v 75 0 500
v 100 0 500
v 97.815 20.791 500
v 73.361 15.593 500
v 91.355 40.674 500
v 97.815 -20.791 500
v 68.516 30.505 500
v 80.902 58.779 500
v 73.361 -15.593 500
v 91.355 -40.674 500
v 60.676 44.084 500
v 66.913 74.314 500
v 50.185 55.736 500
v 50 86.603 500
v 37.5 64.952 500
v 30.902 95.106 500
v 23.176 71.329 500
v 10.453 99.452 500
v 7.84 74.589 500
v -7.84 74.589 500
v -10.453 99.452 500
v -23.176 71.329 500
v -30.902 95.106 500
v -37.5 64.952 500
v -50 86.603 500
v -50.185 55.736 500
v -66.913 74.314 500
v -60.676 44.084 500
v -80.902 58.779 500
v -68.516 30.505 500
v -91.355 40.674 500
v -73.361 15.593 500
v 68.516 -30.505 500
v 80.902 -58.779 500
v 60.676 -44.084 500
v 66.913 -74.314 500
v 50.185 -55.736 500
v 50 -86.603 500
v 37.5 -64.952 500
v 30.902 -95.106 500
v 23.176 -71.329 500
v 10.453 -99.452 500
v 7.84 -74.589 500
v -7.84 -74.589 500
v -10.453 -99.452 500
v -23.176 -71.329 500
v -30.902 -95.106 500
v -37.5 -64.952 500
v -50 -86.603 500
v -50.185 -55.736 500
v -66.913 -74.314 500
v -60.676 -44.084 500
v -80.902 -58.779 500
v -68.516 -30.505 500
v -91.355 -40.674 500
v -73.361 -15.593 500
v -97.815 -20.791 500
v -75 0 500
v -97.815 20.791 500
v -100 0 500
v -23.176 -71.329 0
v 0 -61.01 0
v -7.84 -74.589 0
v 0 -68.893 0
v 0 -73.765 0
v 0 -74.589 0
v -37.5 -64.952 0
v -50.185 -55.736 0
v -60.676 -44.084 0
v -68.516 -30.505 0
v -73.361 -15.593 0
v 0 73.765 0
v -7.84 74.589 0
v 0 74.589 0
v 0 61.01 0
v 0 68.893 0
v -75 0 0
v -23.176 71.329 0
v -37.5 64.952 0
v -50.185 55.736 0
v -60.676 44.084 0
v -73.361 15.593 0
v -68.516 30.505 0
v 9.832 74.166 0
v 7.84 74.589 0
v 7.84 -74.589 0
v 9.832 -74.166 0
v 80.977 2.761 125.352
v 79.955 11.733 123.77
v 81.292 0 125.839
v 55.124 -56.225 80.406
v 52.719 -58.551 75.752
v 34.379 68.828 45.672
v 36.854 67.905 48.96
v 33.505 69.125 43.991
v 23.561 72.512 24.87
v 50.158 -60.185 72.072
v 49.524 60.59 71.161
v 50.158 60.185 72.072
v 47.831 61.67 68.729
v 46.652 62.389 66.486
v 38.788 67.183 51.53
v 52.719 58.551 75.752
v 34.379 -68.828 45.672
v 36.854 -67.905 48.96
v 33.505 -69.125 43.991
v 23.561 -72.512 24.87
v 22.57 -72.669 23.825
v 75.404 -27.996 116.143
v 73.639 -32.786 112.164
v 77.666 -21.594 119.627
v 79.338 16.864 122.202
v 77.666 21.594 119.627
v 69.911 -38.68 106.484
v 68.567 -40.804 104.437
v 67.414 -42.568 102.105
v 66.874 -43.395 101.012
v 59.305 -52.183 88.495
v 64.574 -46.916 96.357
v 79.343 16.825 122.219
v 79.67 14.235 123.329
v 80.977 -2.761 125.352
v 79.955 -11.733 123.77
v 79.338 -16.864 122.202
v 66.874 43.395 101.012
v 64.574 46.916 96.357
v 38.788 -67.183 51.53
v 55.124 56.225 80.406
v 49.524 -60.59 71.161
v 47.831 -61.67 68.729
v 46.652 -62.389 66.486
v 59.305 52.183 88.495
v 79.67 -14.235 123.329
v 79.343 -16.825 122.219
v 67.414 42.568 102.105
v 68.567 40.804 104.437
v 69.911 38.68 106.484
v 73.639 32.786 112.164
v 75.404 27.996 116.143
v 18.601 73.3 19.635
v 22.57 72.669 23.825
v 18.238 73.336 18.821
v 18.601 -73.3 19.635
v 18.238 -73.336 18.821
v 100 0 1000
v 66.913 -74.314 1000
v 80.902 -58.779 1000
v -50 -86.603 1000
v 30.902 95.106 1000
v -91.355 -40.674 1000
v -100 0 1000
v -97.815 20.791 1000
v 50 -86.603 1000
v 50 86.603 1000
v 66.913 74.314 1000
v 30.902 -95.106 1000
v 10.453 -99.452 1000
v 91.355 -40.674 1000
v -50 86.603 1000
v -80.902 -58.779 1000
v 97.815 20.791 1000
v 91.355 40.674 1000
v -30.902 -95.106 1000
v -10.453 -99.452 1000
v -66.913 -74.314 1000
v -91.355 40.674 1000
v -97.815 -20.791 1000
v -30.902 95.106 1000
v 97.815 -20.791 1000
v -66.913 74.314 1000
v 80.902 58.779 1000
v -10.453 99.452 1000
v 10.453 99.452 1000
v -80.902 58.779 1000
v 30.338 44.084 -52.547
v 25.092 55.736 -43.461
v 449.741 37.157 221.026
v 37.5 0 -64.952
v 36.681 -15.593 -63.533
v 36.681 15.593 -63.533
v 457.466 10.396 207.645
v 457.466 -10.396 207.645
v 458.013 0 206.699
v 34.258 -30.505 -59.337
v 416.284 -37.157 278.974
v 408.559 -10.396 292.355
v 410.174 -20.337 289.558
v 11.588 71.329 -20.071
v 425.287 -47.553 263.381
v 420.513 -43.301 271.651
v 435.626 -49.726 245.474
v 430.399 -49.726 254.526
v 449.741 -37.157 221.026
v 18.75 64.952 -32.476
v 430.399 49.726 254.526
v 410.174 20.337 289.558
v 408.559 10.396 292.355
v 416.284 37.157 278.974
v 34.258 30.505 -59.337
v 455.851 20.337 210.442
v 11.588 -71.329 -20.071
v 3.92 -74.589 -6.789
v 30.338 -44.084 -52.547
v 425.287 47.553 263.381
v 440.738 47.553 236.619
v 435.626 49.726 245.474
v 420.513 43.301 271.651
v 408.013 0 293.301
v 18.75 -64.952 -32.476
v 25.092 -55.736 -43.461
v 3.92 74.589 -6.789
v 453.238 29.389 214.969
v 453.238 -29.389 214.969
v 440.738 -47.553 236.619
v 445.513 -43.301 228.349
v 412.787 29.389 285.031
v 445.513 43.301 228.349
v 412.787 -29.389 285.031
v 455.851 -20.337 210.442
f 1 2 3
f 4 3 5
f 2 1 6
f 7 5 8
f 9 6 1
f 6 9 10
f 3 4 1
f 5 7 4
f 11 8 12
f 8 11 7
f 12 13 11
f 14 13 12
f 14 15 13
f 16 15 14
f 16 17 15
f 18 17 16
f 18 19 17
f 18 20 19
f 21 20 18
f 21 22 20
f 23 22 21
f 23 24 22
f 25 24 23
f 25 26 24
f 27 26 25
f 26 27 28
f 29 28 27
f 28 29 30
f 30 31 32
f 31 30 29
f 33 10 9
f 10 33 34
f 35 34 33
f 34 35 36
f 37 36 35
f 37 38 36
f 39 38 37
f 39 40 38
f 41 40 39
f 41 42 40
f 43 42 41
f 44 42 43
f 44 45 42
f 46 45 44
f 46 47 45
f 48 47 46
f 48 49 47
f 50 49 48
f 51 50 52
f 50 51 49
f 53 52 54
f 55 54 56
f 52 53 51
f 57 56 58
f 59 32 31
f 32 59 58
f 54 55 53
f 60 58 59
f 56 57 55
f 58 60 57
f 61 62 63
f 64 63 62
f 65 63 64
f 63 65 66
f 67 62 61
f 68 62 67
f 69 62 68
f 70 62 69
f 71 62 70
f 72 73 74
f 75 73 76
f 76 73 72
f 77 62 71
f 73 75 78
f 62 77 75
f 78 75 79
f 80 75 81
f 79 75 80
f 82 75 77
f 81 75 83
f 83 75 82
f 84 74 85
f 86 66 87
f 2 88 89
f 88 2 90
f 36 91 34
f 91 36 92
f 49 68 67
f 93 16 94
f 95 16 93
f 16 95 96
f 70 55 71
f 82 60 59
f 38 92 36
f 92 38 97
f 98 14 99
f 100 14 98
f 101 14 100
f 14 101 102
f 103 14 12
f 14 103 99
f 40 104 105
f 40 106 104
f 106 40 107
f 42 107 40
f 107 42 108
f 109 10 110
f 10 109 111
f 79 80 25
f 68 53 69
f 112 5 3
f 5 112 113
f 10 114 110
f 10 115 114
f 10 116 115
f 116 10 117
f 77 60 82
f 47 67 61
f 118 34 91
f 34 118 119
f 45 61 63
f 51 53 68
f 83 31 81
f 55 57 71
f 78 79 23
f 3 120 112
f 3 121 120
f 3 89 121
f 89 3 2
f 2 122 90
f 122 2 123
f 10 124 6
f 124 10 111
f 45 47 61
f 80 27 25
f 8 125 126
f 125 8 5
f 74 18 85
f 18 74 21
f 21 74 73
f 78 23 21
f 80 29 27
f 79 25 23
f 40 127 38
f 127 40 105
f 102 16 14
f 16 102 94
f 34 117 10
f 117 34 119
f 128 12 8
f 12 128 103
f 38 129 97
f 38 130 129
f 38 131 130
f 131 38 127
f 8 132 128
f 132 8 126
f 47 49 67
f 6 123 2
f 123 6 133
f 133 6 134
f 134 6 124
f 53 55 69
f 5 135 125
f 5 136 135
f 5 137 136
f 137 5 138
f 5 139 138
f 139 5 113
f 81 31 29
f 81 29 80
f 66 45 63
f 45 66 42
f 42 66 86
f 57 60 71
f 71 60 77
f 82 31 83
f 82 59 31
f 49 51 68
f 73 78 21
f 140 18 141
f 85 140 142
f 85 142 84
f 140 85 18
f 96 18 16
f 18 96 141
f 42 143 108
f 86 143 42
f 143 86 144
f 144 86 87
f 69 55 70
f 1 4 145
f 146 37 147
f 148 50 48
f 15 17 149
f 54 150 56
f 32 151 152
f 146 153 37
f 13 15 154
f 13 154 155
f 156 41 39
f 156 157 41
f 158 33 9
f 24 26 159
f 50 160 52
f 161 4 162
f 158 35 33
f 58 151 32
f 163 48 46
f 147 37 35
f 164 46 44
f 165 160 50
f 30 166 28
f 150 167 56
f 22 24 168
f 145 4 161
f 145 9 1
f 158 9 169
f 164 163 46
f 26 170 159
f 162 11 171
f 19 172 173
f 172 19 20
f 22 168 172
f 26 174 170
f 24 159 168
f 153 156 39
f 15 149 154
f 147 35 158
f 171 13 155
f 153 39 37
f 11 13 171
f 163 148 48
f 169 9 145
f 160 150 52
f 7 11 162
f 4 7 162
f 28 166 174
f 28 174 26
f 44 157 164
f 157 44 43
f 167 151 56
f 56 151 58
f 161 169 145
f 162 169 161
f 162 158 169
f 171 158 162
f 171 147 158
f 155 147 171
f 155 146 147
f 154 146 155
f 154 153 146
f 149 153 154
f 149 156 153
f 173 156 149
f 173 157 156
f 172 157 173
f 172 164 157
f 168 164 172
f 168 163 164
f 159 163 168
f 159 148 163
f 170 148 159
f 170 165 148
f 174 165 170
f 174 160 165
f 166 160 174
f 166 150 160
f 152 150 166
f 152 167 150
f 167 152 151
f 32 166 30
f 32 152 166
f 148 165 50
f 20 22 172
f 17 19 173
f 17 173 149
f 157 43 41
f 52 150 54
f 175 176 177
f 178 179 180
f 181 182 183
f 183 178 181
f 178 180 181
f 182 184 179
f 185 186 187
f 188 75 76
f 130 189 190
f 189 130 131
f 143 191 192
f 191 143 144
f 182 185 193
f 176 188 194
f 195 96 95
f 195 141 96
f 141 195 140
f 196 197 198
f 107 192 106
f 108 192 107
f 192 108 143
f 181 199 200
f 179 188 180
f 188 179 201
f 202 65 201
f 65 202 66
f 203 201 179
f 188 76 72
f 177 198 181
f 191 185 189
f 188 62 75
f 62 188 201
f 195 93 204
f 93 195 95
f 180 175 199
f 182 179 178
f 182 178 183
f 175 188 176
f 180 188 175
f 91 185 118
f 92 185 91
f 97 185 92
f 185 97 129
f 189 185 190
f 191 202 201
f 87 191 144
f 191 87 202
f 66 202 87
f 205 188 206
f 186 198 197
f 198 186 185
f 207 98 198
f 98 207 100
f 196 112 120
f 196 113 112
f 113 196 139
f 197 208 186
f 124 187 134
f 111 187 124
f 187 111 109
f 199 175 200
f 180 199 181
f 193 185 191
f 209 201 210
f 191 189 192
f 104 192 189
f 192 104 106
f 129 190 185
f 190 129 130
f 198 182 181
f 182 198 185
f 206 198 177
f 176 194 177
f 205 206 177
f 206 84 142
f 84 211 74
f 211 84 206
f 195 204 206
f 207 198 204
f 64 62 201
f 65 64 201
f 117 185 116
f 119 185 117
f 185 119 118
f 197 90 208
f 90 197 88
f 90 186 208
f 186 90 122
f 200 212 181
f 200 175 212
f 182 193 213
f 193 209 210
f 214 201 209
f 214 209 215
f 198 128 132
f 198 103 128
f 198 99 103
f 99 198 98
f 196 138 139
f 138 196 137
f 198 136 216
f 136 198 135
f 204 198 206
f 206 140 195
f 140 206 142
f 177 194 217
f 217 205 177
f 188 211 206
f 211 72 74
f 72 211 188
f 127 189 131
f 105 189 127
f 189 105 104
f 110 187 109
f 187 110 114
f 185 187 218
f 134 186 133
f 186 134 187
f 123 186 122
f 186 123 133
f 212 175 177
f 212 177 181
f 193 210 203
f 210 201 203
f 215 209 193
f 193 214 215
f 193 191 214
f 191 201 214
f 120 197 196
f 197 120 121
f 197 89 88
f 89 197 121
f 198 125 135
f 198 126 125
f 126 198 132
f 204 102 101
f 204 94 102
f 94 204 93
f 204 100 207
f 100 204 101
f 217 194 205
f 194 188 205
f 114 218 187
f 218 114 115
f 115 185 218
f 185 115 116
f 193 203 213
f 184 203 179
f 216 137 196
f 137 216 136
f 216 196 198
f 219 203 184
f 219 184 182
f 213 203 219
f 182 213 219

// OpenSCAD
//human figurine

armBend=90;
forearmLength=500;
forearmDiameter=100;


module arm() 
  {
    module forearm() {
        cylinder (d1=forearmDiameter*1.5,d2=forearmDiameter,h=forearmLength);
    }
        module backarm() {
        cylinder (d1=forearmDiameter*1.5,d2=forearmDiameter*2,h=forearmLength);
    }
    forearm();
    backarm();
   
     
    module armsJoin() { translate([0,0,forearmLength]) backarm();}
  armsJoin();
    module armBend() {
        rotate([0,60,0]) forearm();
    }
    armBend();
  }
  
 
  
  arm();
  
